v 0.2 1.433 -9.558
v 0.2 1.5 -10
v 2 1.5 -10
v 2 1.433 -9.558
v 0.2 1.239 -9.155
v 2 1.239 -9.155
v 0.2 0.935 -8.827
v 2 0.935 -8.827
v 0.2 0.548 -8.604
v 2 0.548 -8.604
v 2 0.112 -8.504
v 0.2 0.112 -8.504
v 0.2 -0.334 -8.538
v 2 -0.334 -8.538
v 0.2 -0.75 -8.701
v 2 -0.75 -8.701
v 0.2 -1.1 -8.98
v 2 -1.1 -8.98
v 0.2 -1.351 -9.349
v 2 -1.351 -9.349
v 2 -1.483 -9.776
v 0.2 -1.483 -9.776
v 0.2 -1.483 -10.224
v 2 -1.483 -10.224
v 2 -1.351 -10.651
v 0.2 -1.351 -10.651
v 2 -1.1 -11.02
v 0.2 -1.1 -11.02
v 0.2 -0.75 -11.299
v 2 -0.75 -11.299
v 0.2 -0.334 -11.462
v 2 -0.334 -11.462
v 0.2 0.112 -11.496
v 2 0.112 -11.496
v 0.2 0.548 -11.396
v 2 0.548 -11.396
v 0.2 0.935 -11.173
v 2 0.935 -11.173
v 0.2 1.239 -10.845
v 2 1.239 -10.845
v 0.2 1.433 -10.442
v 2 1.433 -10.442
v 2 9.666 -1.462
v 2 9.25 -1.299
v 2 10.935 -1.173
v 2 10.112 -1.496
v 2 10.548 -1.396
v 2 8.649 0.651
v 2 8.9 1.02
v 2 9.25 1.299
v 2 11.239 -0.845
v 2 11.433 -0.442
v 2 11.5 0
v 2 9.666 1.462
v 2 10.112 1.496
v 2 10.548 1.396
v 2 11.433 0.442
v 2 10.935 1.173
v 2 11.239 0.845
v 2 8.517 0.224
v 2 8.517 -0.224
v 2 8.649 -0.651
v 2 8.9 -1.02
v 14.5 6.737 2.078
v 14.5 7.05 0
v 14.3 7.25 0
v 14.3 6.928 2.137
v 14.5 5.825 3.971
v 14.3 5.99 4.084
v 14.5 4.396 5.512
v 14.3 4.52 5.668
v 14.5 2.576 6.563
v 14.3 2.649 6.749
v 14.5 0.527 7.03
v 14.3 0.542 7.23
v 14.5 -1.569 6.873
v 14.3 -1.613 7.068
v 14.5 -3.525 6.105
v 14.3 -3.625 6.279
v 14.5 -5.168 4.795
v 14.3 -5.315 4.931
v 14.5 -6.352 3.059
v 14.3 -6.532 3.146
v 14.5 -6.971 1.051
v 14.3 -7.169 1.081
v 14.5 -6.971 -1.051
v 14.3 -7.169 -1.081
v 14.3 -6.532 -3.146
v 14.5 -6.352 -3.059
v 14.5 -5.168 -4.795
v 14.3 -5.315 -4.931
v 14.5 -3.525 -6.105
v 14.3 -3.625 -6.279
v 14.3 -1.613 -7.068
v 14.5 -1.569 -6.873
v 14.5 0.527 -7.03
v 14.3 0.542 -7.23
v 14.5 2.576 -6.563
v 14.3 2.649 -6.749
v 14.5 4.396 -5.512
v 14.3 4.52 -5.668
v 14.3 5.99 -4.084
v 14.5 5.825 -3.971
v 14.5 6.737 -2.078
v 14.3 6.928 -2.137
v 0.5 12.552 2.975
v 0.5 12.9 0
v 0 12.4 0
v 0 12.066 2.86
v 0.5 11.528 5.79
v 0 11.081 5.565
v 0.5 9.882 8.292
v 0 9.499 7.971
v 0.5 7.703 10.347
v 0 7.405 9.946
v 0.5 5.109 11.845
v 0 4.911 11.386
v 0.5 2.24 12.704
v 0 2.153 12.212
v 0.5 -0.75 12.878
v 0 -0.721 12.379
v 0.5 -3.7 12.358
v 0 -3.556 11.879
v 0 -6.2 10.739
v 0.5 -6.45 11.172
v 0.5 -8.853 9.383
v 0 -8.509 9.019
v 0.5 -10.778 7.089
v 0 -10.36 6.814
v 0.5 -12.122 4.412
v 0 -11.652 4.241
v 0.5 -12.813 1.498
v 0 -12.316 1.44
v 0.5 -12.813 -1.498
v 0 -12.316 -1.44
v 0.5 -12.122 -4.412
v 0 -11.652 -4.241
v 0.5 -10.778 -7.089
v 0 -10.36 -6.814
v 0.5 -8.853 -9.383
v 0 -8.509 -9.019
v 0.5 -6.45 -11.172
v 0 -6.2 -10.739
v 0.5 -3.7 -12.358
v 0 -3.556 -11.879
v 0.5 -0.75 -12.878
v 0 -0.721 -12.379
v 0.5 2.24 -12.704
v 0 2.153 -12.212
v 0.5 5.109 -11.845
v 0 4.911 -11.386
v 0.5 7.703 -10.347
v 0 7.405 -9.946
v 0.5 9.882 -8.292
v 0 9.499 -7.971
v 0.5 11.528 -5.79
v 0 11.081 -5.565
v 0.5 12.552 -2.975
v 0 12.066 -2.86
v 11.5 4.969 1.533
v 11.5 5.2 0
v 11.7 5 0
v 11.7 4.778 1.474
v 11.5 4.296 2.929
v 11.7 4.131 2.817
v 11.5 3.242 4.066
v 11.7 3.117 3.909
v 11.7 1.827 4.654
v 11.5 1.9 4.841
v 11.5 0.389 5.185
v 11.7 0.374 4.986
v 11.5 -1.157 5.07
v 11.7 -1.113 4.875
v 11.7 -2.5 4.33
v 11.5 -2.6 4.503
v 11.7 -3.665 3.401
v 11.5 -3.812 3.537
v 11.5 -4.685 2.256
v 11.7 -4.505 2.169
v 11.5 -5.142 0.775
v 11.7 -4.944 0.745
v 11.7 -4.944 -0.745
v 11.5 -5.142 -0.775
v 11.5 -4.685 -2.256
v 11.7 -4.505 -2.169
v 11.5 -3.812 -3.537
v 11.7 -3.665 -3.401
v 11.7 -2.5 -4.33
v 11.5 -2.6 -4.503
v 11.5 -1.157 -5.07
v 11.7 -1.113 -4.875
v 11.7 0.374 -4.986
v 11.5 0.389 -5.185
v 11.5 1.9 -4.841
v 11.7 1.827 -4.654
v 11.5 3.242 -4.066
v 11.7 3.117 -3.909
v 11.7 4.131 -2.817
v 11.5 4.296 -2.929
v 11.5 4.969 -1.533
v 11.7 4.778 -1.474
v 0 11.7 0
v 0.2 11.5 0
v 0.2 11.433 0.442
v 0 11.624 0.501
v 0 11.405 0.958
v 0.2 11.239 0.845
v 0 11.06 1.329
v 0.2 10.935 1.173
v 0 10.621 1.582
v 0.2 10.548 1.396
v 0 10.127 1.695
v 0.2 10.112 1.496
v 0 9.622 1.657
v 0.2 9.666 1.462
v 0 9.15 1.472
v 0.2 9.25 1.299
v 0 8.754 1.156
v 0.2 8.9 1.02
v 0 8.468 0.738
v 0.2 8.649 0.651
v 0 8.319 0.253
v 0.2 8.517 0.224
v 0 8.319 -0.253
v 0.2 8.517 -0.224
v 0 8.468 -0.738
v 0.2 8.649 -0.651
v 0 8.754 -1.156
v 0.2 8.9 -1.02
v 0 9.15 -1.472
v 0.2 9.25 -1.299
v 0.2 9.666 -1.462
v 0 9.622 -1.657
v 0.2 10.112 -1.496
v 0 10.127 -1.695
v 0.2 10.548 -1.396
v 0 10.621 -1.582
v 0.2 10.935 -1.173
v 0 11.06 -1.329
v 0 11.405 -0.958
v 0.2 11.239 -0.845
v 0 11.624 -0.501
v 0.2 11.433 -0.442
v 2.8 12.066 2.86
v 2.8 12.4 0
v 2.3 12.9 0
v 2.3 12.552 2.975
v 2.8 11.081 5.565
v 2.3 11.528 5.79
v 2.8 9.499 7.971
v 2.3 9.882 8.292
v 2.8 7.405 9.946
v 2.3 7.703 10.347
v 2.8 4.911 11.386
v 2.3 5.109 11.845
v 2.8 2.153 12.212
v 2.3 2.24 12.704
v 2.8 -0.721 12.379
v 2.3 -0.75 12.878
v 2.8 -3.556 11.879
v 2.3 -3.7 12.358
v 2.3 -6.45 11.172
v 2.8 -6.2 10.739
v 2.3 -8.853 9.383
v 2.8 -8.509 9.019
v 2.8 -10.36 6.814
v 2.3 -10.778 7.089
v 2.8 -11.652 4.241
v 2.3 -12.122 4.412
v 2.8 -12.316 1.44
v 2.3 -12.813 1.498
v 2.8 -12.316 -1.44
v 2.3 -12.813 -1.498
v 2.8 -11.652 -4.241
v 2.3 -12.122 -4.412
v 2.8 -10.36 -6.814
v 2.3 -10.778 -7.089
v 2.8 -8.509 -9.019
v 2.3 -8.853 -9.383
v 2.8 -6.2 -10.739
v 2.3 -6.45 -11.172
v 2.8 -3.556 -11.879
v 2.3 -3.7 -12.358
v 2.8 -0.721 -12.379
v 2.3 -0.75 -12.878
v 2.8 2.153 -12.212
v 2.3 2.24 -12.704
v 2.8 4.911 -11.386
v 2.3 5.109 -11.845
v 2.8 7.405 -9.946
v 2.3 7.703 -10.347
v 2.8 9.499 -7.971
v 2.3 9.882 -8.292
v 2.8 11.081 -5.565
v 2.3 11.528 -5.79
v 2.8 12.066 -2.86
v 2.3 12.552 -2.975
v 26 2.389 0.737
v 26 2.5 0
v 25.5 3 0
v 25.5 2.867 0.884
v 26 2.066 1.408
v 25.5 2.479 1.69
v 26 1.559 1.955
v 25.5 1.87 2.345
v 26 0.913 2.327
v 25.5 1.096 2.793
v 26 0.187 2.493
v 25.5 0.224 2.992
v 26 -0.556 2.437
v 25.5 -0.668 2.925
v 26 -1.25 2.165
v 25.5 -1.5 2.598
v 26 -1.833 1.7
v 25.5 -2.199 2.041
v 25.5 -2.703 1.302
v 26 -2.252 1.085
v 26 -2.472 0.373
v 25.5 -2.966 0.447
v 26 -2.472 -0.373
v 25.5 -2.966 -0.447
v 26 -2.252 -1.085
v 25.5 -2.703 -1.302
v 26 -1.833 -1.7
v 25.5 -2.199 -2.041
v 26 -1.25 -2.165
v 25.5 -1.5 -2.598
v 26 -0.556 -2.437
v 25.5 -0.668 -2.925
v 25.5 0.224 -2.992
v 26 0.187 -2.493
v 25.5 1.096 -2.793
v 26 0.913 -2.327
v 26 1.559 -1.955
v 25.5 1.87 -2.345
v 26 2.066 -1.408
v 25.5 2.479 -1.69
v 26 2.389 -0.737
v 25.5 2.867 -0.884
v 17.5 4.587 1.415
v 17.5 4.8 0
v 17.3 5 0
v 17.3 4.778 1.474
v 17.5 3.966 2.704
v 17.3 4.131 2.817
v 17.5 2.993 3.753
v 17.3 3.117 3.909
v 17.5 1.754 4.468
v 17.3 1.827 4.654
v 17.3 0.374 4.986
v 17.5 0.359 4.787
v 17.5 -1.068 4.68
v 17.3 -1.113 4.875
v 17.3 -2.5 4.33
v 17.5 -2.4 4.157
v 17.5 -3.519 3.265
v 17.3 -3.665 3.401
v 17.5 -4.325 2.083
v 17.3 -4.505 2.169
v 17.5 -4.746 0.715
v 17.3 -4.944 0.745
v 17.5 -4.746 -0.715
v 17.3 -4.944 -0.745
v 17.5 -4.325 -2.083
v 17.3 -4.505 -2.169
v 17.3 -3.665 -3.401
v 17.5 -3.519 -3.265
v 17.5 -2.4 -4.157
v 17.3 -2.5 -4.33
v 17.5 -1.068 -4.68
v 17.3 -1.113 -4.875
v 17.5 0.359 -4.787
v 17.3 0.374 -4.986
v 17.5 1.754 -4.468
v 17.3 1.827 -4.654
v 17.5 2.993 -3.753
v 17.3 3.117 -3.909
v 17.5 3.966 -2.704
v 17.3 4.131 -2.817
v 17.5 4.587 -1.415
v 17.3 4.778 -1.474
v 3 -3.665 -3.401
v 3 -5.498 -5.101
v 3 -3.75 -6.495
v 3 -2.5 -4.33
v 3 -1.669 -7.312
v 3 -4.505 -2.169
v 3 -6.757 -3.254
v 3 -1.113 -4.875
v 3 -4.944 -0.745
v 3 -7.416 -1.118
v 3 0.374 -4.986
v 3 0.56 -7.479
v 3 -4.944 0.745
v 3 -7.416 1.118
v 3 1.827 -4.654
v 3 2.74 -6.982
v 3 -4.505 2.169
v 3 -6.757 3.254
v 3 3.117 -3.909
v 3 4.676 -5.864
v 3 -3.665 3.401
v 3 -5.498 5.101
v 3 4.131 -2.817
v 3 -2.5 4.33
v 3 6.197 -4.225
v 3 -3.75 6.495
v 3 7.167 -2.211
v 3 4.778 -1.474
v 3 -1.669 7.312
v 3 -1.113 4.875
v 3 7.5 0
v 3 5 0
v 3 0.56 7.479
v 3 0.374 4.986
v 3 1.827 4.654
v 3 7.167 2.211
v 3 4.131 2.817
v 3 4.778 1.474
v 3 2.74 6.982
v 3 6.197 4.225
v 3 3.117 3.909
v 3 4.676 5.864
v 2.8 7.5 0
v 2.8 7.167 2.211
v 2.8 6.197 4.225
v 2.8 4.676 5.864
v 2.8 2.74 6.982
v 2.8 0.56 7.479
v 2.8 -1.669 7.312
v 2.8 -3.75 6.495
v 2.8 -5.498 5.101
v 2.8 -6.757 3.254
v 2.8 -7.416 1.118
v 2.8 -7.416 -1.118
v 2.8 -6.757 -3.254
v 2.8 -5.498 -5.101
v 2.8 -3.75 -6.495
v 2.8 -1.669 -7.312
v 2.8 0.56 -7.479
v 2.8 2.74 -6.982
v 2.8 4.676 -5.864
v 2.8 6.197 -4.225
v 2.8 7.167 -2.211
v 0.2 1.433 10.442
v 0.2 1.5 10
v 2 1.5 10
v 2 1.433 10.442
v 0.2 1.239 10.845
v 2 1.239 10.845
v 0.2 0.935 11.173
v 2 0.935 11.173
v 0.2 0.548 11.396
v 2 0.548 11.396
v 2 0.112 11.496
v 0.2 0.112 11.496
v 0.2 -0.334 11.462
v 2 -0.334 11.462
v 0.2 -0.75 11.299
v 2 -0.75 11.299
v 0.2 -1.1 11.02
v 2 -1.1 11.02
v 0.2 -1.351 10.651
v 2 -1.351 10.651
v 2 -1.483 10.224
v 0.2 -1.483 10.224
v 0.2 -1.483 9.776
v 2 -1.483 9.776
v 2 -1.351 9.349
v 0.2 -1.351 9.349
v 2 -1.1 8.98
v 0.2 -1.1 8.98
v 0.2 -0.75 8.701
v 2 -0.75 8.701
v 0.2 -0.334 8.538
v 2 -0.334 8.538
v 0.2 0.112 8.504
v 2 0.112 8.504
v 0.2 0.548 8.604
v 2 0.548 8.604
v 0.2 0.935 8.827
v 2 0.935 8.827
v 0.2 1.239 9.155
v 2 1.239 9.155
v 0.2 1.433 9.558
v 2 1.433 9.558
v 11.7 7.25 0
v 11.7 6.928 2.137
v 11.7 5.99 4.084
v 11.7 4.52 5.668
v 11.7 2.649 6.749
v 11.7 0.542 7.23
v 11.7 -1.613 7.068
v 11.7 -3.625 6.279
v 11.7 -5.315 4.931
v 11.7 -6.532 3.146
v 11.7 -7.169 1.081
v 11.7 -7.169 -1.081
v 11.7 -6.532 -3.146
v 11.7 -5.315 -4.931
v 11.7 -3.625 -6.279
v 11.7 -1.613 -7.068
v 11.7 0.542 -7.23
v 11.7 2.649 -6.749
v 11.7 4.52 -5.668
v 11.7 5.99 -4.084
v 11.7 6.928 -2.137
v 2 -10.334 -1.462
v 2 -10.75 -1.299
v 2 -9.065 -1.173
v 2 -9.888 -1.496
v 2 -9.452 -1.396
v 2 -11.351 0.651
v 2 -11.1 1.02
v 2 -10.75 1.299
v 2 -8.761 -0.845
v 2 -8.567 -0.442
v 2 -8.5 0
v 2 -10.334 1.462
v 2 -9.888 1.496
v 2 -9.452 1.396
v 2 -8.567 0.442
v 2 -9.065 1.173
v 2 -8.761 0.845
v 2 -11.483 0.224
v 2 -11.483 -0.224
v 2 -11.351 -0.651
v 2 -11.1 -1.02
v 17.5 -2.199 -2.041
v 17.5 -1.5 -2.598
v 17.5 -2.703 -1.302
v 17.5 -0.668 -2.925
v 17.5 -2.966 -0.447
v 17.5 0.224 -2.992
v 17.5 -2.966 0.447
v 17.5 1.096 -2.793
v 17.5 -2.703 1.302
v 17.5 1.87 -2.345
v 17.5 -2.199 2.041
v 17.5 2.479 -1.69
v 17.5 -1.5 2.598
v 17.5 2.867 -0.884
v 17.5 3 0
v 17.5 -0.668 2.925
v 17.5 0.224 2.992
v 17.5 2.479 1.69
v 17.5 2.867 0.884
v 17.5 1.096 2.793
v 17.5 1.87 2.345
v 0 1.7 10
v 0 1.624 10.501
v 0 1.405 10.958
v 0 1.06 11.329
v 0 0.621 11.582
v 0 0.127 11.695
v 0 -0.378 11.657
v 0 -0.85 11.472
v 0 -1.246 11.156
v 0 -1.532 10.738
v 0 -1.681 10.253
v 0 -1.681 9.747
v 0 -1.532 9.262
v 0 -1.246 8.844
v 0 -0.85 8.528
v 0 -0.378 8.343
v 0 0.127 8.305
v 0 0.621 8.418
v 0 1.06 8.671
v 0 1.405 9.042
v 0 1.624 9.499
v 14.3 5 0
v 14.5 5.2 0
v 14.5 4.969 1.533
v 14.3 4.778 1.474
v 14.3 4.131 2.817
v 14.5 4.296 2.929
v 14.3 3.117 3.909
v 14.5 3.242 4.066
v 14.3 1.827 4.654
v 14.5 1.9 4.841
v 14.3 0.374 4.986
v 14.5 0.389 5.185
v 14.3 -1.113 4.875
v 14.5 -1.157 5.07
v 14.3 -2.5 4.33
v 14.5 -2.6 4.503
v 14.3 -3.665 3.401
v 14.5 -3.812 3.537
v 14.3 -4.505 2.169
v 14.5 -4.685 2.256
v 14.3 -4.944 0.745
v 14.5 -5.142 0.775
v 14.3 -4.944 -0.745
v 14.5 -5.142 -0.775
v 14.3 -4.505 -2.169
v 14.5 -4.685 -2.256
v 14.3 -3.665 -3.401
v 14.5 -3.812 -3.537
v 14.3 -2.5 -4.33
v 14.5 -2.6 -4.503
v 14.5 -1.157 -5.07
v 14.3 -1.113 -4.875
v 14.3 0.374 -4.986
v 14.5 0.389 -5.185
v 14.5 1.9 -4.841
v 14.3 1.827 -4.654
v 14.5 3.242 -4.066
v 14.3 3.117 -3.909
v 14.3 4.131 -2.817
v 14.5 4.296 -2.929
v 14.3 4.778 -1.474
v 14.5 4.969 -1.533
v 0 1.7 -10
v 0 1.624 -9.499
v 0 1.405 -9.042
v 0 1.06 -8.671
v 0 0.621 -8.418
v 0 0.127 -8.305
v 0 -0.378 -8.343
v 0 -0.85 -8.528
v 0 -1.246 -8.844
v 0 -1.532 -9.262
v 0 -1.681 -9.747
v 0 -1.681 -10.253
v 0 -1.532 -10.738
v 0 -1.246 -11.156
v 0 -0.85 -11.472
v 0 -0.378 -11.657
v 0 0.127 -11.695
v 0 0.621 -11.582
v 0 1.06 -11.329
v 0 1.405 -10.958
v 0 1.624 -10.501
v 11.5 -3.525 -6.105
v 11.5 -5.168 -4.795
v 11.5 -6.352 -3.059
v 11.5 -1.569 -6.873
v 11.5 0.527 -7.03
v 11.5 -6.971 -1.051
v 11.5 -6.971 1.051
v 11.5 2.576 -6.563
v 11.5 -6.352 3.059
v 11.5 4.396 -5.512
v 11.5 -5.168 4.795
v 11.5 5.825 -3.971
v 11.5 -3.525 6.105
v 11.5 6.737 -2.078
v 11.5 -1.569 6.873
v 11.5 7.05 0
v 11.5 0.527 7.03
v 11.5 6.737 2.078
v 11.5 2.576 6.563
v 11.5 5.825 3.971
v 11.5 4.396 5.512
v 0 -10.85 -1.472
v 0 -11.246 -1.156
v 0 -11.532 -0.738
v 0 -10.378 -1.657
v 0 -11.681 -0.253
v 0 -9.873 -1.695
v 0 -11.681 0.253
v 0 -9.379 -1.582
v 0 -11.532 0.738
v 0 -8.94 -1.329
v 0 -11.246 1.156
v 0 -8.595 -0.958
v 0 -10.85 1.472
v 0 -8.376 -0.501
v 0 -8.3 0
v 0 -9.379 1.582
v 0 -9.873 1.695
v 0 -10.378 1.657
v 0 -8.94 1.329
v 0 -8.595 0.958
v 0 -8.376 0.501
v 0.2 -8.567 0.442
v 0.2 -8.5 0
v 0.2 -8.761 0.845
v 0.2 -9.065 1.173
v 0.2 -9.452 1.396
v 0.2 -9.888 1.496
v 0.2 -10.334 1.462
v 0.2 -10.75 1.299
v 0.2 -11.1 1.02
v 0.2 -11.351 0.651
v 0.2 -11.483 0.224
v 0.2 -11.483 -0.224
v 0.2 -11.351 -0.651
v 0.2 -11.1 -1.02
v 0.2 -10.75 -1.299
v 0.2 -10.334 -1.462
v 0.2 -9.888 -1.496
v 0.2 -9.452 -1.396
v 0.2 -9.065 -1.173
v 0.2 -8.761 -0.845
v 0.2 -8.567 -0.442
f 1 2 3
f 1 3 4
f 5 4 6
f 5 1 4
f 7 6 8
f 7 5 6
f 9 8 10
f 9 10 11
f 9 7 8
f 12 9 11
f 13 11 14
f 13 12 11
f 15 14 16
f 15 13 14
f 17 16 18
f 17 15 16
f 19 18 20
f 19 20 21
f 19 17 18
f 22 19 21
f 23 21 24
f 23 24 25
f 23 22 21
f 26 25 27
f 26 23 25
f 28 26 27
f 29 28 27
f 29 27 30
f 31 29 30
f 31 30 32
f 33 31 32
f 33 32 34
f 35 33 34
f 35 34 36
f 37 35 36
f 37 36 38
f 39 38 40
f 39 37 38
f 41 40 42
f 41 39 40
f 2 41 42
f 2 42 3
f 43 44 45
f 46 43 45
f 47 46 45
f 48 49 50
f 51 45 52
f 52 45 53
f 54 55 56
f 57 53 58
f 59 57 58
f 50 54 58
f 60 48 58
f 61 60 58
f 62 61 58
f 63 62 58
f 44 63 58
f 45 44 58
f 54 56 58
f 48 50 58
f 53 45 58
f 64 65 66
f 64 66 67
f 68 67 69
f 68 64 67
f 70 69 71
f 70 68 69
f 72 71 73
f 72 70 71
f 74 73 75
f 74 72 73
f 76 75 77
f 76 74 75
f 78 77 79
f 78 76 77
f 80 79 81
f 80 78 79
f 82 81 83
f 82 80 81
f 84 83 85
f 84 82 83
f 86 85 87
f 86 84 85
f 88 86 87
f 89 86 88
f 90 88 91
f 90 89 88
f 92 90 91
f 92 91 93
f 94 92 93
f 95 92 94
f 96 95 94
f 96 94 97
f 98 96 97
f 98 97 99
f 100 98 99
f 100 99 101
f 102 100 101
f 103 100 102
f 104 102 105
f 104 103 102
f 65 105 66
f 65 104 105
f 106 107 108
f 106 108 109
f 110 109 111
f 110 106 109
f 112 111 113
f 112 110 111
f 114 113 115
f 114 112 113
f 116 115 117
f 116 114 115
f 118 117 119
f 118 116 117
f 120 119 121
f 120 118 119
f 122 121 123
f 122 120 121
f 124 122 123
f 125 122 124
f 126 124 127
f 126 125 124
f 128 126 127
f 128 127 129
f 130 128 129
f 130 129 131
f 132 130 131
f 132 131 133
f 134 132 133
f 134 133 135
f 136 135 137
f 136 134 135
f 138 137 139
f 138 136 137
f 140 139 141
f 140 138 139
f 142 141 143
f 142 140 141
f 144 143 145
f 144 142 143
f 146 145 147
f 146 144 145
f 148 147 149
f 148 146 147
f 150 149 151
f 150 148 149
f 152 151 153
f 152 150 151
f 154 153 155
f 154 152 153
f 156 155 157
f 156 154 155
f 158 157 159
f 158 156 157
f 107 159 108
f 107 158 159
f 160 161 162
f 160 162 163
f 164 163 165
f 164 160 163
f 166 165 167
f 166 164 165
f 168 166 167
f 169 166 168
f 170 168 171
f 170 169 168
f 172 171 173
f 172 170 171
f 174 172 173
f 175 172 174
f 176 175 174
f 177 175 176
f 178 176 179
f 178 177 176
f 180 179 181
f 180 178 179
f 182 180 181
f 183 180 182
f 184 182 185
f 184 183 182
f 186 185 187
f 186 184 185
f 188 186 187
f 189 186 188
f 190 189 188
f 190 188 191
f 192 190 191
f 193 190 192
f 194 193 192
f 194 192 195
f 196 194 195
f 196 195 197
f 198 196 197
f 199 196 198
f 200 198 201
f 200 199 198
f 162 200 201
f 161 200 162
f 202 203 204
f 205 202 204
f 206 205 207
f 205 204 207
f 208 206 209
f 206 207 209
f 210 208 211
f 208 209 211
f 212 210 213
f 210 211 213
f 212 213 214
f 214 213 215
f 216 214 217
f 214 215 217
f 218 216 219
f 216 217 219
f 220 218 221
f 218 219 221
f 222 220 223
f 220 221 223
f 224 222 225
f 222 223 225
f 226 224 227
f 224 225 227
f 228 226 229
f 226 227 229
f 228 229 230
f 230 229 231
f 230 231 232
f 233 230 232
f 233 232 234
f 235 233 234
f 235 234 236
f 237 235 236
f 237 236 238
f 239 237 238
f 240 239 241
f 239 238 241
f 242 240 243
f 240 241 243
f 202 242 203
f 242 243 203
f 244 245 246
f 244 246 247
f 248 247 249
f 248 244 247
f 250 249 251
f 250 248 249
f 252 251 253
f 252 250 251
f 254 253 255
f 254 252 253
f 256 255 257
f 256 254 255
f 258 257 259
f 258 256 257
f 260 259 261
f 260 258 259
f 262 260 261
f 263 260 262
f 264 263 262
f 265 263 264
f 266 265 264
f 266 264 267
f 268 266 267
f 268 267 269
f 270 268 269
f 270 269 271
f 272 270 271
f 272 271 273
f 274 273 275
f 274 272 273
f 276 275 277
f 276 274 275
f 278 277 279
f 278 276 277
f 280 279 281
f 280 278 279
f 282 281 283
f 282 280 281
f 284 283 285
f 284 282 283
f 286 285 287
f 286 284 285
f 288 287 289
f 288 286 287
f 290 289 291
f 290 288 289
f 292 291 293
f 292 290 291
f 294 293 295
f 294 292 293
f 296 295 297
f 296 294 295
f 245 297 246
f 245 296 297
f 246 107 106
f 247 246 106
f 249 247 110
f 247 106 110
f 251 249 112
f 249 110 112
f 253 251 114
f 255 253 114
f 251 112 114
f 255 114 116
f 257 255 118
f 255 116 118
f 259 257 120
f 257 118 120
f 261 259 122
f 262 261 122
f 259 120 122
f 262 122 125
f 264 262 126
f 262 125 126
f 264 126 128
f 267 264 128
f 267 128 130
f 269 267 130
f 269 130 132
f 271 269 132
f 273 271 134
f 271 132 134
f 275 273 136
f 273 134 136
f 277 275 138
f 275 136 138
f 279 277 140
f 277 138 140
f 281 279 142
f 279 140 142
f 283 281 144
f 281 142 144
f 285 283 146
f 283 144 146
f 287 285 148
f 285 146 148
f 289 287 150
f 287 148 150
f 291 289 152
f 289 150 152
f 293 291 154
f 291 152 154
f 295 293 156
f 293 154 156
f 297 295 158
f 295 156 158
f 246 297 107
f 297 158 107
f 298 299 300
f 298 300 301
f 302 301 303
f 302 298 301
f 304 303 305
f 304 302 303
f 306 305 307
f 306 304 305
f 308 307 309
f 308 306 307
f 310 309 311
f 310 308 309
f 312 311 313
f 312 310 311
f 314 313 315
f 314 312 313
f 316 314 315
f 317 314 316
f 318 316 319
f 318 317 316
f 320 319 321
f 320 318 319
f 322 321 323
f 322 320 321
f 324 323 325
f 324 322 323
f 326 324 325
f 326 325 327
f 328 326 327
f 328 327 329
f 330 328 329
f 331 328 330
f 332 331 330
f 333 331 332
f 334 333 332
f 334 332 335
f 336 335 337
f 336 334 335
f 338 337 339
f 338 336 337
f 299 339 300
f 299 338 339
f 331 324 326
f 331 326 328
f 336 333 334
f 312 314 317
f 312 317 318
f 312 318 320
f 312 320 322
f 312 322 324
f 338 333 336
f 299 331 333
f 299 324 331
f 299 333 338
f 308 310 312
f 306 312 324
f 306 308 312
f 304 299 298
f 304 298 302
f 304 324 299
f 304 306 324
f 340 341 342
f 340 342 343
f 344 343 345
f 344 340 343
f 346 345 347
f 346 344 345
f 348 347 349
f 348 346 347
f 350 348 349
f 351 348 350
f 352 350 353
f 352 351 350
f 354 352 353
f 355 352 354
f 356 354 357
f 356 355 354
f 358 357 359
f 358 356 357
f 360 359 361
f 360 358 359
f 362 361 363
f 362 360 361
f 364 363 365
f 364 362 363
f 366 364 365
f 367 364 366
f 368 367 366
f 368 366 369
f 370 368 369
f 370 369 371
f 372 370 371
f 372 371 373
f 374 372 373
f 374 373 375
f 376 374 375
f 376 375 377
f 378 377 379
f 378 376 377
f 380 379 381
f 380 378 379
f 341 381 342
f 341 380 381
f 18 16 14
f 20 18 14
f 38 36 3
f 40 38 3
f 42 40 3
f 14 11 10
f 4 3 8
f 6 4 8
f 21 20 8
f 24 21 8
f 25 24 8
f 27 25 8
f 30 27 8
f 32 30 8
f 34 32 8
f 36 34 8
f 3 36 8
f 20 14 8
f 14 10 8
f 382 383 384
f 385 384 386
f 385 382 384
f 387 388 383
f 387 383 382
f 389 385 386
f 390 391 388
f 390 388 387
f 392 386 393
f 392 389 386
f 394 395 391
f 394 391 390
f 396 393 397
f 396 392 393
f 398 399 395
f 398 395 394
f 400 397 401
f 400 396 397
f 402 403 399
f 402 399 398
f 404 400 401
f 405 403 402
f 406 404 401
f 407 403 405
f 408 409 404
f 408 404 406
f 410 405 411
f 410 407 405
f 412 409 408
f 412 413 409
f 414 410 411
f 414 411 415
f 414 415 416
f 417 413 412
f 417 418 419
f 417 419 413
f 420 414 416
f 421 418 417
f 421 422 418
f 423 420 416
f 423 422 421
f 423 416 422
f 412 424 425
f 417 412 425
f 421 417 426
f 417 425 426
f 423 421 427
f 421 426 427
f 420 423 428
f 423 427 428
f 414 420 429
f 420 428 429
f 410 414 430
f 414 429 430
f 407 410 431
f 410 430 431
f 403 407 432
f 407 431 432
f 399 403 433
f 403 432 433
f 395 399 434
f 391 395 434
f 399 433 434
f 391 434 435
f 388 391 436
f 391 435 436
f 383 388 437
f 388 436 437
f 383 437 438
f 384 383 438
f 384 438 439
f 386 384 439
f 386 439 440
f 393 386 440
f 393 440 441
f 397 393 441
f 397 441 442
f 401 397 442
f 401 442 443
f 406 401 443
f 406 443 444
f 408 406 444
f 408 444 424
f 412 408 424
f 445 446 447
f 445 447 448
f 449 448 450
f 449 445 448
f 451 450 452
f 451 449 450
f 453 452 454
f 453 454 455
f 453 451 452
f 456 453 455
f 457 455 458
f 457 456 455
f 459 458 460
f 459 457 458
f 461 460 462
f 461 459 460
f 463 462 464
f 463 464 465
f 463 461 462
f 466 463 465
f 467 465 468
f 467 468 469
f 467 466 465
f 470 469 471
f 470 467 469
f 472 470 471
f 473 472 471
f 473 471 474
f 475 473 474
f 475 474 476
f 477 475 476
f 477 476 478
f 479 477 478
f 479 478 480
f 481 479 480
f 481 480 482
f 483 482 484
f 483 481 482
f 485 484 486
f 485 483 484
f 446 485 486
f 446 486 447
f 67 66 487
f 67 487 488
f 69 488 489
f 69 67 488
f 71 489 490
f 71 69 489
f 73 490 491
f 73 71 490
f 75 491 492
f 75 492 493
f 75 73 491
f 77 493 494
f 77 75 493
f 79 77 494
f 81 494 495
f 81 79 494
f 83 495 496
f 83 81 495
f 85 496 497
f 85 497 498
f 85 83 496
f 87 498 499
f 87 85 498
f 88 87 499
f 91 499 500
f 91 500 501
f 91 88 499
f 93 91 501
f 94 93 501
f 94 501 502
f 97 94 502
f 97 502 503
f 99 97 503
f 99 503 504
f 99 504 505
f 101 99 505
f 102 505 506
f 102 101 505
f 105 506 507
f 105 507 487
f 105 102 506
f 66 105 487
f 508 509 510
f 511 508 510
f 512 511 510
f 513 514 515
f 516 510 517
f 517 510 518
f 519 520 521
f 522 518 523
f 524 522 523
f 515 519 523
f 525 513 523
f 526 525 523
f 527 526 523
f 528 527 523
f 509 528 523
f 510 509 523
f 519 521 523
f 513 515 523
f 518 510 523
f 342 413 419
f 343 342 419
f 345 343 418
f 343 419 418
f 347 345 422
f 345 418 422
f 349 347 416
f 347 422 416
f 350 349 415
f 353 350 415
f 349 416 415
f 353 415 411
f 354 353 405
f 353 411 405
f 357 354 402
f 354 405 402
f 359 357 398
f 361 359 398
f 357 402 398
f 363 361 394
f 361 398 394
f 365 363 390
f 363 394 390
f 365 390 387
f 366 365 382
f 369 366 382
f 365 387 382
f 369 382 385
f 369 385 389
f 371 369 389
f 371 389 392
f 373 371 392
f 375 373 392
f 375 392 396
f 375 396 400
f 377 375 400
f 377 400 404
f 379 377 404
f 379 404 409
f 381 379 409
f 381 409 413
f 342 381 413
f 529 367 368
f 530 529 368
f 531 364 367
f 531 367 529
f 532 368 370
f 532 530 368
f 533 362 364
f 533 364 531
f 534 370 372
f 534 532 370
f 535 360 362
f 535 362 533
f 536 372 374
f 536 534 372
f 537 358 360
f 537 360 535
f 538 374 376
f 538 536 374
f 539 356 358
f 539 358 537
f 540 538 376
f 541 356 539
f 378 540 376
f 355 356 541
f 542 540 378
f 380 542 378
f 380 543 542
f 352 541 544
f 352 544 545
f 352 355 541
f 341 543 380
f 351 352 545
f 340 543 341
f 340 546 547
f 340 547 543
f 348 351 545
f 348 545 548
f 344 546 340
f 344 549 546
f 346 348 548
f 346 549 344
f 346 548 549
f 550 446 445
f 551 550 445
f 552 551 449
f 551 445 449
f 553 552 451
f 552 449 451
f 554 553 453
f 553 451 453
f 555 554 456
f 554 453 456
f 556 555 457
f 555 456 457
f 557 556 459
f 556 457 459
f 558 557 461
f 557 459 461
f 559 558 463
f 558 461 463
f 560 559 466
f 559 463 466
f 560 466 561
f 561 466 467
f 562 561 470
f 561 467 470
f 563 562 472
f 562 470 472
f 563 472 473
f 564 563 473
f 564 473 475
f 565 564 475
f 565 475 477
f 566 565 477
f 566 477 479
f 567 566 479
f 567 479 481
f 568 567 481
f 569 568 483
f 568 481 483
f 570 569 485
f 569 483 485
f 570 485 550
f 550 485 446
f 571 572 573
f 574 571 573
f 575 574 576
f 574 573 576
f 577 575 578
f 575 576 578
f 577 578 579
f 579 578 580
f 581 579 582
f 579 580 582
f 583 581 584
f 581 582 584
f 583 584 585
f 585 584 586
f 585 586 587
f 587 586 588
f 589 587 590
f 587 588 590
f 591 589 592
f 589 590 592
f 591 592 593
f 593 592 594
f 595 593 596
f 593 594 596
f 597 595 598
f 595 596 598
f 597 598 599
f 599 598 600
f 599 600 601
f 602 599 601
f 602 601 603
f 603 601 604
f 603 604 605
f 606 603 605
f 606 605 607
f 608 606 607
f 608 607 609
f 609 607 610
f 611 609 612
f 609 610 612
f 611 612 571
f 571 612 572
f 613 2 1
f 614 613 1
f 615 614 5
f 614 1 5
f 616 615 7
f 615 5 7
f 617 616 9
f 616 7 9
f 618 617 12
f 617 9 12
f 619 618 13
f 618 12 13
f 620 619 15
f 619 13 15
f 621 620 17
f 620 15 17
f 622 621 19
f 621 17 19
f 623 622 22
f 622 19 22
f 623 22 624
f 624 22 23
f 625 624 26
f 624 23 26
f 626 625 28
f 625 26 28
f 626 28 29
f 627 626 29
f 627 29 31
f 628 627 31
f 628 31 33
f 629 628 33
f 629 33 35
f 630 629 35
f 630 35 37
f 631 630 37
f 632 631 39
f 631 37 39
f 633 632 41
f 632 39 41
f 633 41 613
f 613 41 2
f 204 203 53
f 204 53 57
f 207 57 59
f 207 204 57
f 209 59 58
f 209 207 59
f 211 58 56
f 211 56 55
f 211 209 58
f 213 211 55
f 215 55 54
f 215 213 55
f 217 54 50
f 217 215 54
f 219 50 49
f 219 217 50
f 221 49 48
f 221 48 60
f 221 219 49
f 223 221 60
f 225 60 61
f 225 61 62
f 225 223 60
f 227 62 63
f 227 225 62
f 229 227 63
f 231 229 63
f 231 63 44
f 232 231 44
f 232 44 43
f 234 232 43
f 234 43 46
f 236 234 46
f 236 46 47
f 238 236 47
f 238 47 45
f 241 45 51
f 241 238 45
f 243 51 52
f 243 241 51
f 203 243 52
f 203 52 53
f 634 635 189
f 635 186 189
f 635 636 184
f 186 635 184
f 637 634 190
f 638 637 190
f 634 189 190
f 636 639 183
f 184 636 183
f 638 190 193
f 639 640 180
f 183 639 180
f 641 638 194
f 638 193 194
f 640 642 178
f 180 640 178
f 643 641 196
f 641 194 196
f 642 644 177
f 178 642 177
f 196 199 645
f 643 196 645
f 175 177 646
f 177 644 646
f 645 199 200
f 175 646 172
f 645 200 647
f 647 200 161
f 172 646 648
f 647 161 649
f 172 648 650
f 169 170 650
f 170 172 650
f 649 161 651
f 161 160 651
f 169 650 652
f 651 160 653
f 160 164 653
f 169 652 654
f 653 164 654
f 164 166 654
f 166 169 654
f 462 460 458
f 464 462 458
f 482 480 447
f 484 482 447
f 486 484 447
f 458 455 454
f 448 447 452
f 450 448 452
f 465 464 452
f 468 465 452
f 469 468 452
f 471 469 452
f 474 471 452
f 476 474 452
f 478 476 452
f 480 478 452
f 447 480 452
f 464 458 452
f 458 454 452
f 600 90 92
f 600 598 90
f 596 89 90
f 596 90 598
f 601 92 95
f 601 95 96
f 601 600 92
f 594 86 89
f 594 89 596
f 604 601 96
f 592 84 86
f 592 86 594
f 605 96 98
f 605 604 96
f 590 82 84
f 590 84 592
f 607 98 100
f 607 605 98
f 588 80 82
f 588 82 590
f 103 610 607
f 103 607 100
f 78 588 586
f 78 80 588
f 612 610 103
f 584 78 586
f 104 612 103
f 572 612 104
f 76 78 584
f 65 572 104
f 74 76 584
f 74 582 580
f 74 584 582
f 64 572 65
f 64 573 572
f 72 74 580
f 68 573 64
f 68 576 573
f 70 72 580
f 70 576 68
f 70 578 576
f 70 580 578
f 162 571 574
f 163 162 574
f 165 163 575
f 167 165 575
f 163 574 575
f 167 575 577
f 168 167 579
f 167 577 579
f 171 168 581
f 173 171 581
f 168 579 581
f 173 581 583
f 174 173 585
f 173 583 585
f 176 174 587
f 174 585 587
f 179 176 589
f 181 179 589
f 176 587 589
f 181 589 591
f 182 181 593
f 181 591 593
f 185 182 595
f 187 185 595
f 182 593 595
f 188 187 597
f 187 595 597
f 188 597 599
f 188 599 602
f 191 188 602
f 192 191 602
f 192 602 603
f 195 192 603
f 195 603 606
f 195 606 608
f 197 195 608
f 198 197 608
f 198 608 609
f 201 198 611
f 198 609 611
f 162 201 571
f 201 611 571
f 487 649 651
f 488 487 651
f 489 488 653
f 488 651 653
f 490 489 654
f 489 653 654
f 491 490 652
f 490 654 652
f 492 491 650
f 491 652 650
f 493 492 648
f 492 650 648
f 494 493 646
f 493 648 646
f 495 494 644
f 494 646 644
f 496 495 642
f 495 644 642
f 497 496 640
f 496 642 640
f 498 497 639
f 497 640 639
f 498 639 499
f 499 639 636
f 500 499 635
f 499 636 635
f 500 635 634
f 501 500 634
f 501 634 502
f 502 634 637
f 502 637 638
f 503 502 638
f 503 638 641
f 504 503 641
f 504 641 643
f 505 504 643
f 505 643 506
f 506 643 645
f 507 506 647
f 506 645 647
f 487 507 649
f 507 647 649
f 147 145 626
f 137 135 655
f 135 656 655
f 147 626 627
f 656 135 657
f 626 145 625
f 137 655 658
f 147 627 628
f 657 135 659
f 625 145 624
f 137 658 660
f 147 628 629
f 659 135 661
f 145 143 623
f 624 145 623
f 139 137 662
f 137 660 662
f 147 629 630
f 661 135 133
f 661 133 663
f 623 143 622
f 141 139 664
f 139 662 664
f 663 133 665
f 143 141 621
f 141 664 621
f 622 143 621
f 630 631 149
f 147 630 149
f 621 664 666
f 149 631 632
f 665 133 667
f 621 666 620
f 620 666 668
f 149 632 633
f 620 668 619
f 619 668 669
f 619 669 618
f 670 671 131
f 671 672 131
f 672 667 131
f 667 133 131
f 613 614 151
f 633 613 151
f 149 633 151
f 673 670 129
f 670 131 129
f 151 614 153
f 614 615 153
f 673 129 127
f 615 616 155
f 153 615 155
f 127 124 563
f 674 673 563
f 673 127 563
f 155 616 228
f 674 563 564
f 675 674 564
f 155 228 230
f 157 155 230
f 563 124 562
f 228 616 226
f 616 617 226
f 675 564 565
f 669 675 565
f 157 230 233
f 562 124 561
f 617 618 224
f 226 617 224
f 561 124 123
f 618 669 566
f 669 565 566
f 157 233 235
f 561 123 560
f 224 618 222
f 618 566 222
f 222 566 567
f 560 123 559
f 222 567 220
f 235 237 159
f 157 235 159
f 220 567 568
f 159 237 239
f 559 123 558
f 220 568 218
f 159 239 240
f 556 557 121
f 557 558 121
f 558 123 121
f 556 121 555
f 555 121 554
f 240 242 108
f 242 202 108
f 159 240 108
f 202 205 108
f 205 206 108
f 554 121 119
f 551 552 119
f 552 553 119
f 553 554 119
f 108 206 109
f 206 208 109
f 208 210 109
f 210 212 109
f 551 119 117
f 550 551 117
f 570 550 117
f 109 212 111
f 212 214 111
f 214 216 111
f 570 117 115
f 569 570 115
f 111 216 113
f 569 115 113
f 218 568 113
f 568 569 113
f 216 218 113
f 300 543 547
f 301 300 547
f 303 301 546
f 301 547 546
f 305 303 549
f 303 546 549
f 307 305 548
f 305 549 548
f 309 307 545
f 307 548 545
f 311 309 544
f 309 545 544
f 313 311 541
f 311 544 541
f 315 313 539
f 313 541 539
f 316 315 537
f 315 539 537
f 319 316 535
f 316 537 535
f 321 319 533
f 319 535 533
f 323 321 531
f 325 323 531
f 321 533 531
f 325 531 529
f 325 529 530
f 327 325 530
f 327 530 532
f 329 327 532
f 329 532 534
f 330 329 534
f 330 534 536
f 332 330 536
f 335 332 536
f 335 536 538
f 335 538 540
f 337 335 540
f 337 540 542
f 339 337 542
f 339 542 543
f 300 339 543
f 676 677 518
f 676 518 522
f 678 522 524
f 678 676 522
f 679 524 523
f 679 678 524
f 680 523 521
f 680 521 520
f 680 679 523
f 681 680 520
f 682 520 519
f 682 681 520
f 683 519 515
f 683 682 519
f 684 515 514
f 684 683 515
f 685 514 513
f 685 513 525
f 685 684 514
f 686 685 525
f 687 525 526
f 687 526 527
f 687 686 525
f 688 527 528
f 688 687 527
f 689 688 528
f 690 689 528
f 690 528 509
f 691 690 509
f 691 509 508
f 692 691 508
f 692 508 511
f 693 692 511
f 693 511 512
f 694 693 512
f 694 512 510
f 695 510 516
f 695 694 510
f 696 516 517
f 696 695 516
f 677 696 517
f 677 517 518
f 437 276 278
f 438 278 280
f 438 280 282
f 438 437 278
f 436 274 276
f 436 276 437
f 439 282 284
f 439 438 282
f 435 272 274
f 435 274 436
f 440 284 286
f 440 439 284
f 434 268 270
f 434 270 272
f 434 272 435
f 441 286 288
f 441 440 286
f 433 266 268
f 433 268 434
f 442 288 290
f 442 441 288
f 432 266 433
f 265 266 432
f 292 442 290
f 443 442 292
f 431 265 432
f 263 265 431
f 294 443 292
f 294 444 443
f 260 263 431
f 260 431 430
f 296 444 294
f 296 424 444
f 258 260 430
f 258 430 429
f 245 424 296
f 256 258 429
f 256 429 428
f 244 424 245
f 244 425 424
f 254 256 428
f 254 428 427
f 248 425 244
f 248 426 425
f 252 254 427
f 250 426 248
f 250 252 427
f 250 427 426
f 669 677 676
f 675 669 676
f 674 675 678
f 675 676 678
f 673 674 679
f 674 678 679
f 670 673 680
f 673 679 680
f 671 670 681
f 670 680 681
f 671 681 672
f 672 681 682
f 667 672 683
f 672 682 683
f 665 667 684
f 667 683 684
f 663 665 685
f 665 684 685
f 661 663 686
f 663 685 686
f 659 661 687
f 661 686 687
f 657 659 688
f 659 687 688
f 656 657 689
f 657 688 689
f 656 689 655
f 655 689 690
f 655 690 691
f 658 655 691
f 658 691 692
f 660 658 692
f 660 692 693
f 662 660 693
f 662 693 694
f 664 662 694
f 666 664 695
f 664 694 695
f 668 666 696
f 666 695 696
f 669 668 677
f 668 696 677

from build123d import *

# Parameters (mm, degrees)
F0_R     = 12.9
F0_R_2   = 1.5
F0_R_3   = 7.5
F0_R_4   = 5
F0_R_5   = 3
F1_DEPTH = 2.8
F2_DEPTH = 3
F3_DEPTH = 26
F4_SIZE  = 0.5
F5_DEPTH = 17.5
F6_DEPTH = 2
F7_SIZE  = 0.2
F9_START = -3
F8_R     = 7.25
F8_R_2   = 5
F9_DEPTH = 3
F10_SIZE = 0.2


with BuildPart() as f1:
    # F0 (on Right) → F1 (new body)
    with BuildSketch(Plane.YZ):
        Circle(F0_R)
        with Locations((0, -10)):
            Circle(F0_R_2, mode=Mode.SUBTRACT)
        with Locations((-10, 0)):
            Circle(F0_R_2, mode=Mode.SUBTRACT)
        Circle(F0_R_3, mode=Mode.SUBTRACT)
        with Locations((10, 0)):
            Circle(F0_R_2, mode=Mode.SUBTRACT)
        with Locations((0, 10)):
            Circle(F0_R_2, mode=Mode.SUBTRACT)
        Circle(F0_R_3)
        Circle(F0_R_4, mode=Mode.SUBTRACT)
        Circle(F0_R_4)
        Circle(F0_R_5, mode=Mode.SUBTRACT)
        Circle(F0_R_5)
        with Locations((10, 0)):
            Circle(F0_R_2)
        with Locations((0, 10)):
            Circle(F0_R_2)
        with Locations((-10, 0)):
            Circle(F0_R_2)
        with Locations((0, -10)):
            Circle(F0_R_2)
    extrude(amount=F1_DEPTH)

    # F0 (on Right) → F2 (join)
    with BuildSketch(Plane.YZ):
        Circle(F0_R_3)
        Circle(F0_R_4, mode=Mode.SUBTRACT)
        Circle(F0_R_4)
        Circle(F0_R_5, mode=Mode.SUBTRACT)
        Circle(F0_R_5)
    extrude(amount=F2_DEPTH)

    # F0 (on Right) → F3 (join)
    with BuildSketch(Plane.YZ):
        Circle(F0_R_5)
    extrude(amount=F3_DEPTH)

    # F4
    f4_edges = [f1.edges().sort_by_distance(p)[0] for p in [
        (0, -12.9, 0),
        (2.8, -12.9, 0),
        (26, -3, 0),
    ]]
    chamfer(f4_edges, length=F4_SIZE)

    # F0 (on Right) → F5 (join)
    with BuildSketch(Plane.YZ):
        Circle(F0_R_4)
        Circle(F0_R_5, mode=Mode.SUBTRACT)
        Circle(F0_R_5)
    extrude(amount=F5_DEPTH)

    # F0 (on Right) → F6 (cut)
    with BuildSketch(Plane.YZ):
        with Locations((10, 0)):
            Circle(F0_R_2)
        with Locations((0, -10)):
            Circle(F0_R_2)
        with Locations((0, 10)):
            Circle(F0_R_2)
        with Locations((-10, 0)):
            Circle(F0_R_2)
    extrude(amount=F6_DEPTH, mode=Mode.SUBTRACT)

    # F7
    f7_edges = [f1.edges().sort_by_distance(p)[0] for p in [
        (0, -1.5, -10),
        (0, -11.5, 0),
        (0, -1.5, 10),
        (0, 8.5, 0),
        (17.5, -5, 0),
    ]]
    chamfer(f7_edges, length=F7_SIZE)


with BuildPart() as f9:
    # F8 (on face) → F9 (new body)
    with BuildSketch(Plane.YZ.offset(17.5).offset(F9_START)):
        Circle(F8_R)
        Circle(F8_R_2, mode=Mode.SUBTRACT)
    extrude(amount=-F9_DEPTH)

    # F10
    f10_edges = [f9.edges().sort_by_distance(p)[0] for p in [
        (14.5, -5, 0),
        (14.5, -7.25, 0),
        (11.5, -7.25, 0),
        (11.5, -5, 0),
    ]]
    chamfer(f10_edges, length=F10_SIZE)


solid = Compound([f1.part, f9.part])
